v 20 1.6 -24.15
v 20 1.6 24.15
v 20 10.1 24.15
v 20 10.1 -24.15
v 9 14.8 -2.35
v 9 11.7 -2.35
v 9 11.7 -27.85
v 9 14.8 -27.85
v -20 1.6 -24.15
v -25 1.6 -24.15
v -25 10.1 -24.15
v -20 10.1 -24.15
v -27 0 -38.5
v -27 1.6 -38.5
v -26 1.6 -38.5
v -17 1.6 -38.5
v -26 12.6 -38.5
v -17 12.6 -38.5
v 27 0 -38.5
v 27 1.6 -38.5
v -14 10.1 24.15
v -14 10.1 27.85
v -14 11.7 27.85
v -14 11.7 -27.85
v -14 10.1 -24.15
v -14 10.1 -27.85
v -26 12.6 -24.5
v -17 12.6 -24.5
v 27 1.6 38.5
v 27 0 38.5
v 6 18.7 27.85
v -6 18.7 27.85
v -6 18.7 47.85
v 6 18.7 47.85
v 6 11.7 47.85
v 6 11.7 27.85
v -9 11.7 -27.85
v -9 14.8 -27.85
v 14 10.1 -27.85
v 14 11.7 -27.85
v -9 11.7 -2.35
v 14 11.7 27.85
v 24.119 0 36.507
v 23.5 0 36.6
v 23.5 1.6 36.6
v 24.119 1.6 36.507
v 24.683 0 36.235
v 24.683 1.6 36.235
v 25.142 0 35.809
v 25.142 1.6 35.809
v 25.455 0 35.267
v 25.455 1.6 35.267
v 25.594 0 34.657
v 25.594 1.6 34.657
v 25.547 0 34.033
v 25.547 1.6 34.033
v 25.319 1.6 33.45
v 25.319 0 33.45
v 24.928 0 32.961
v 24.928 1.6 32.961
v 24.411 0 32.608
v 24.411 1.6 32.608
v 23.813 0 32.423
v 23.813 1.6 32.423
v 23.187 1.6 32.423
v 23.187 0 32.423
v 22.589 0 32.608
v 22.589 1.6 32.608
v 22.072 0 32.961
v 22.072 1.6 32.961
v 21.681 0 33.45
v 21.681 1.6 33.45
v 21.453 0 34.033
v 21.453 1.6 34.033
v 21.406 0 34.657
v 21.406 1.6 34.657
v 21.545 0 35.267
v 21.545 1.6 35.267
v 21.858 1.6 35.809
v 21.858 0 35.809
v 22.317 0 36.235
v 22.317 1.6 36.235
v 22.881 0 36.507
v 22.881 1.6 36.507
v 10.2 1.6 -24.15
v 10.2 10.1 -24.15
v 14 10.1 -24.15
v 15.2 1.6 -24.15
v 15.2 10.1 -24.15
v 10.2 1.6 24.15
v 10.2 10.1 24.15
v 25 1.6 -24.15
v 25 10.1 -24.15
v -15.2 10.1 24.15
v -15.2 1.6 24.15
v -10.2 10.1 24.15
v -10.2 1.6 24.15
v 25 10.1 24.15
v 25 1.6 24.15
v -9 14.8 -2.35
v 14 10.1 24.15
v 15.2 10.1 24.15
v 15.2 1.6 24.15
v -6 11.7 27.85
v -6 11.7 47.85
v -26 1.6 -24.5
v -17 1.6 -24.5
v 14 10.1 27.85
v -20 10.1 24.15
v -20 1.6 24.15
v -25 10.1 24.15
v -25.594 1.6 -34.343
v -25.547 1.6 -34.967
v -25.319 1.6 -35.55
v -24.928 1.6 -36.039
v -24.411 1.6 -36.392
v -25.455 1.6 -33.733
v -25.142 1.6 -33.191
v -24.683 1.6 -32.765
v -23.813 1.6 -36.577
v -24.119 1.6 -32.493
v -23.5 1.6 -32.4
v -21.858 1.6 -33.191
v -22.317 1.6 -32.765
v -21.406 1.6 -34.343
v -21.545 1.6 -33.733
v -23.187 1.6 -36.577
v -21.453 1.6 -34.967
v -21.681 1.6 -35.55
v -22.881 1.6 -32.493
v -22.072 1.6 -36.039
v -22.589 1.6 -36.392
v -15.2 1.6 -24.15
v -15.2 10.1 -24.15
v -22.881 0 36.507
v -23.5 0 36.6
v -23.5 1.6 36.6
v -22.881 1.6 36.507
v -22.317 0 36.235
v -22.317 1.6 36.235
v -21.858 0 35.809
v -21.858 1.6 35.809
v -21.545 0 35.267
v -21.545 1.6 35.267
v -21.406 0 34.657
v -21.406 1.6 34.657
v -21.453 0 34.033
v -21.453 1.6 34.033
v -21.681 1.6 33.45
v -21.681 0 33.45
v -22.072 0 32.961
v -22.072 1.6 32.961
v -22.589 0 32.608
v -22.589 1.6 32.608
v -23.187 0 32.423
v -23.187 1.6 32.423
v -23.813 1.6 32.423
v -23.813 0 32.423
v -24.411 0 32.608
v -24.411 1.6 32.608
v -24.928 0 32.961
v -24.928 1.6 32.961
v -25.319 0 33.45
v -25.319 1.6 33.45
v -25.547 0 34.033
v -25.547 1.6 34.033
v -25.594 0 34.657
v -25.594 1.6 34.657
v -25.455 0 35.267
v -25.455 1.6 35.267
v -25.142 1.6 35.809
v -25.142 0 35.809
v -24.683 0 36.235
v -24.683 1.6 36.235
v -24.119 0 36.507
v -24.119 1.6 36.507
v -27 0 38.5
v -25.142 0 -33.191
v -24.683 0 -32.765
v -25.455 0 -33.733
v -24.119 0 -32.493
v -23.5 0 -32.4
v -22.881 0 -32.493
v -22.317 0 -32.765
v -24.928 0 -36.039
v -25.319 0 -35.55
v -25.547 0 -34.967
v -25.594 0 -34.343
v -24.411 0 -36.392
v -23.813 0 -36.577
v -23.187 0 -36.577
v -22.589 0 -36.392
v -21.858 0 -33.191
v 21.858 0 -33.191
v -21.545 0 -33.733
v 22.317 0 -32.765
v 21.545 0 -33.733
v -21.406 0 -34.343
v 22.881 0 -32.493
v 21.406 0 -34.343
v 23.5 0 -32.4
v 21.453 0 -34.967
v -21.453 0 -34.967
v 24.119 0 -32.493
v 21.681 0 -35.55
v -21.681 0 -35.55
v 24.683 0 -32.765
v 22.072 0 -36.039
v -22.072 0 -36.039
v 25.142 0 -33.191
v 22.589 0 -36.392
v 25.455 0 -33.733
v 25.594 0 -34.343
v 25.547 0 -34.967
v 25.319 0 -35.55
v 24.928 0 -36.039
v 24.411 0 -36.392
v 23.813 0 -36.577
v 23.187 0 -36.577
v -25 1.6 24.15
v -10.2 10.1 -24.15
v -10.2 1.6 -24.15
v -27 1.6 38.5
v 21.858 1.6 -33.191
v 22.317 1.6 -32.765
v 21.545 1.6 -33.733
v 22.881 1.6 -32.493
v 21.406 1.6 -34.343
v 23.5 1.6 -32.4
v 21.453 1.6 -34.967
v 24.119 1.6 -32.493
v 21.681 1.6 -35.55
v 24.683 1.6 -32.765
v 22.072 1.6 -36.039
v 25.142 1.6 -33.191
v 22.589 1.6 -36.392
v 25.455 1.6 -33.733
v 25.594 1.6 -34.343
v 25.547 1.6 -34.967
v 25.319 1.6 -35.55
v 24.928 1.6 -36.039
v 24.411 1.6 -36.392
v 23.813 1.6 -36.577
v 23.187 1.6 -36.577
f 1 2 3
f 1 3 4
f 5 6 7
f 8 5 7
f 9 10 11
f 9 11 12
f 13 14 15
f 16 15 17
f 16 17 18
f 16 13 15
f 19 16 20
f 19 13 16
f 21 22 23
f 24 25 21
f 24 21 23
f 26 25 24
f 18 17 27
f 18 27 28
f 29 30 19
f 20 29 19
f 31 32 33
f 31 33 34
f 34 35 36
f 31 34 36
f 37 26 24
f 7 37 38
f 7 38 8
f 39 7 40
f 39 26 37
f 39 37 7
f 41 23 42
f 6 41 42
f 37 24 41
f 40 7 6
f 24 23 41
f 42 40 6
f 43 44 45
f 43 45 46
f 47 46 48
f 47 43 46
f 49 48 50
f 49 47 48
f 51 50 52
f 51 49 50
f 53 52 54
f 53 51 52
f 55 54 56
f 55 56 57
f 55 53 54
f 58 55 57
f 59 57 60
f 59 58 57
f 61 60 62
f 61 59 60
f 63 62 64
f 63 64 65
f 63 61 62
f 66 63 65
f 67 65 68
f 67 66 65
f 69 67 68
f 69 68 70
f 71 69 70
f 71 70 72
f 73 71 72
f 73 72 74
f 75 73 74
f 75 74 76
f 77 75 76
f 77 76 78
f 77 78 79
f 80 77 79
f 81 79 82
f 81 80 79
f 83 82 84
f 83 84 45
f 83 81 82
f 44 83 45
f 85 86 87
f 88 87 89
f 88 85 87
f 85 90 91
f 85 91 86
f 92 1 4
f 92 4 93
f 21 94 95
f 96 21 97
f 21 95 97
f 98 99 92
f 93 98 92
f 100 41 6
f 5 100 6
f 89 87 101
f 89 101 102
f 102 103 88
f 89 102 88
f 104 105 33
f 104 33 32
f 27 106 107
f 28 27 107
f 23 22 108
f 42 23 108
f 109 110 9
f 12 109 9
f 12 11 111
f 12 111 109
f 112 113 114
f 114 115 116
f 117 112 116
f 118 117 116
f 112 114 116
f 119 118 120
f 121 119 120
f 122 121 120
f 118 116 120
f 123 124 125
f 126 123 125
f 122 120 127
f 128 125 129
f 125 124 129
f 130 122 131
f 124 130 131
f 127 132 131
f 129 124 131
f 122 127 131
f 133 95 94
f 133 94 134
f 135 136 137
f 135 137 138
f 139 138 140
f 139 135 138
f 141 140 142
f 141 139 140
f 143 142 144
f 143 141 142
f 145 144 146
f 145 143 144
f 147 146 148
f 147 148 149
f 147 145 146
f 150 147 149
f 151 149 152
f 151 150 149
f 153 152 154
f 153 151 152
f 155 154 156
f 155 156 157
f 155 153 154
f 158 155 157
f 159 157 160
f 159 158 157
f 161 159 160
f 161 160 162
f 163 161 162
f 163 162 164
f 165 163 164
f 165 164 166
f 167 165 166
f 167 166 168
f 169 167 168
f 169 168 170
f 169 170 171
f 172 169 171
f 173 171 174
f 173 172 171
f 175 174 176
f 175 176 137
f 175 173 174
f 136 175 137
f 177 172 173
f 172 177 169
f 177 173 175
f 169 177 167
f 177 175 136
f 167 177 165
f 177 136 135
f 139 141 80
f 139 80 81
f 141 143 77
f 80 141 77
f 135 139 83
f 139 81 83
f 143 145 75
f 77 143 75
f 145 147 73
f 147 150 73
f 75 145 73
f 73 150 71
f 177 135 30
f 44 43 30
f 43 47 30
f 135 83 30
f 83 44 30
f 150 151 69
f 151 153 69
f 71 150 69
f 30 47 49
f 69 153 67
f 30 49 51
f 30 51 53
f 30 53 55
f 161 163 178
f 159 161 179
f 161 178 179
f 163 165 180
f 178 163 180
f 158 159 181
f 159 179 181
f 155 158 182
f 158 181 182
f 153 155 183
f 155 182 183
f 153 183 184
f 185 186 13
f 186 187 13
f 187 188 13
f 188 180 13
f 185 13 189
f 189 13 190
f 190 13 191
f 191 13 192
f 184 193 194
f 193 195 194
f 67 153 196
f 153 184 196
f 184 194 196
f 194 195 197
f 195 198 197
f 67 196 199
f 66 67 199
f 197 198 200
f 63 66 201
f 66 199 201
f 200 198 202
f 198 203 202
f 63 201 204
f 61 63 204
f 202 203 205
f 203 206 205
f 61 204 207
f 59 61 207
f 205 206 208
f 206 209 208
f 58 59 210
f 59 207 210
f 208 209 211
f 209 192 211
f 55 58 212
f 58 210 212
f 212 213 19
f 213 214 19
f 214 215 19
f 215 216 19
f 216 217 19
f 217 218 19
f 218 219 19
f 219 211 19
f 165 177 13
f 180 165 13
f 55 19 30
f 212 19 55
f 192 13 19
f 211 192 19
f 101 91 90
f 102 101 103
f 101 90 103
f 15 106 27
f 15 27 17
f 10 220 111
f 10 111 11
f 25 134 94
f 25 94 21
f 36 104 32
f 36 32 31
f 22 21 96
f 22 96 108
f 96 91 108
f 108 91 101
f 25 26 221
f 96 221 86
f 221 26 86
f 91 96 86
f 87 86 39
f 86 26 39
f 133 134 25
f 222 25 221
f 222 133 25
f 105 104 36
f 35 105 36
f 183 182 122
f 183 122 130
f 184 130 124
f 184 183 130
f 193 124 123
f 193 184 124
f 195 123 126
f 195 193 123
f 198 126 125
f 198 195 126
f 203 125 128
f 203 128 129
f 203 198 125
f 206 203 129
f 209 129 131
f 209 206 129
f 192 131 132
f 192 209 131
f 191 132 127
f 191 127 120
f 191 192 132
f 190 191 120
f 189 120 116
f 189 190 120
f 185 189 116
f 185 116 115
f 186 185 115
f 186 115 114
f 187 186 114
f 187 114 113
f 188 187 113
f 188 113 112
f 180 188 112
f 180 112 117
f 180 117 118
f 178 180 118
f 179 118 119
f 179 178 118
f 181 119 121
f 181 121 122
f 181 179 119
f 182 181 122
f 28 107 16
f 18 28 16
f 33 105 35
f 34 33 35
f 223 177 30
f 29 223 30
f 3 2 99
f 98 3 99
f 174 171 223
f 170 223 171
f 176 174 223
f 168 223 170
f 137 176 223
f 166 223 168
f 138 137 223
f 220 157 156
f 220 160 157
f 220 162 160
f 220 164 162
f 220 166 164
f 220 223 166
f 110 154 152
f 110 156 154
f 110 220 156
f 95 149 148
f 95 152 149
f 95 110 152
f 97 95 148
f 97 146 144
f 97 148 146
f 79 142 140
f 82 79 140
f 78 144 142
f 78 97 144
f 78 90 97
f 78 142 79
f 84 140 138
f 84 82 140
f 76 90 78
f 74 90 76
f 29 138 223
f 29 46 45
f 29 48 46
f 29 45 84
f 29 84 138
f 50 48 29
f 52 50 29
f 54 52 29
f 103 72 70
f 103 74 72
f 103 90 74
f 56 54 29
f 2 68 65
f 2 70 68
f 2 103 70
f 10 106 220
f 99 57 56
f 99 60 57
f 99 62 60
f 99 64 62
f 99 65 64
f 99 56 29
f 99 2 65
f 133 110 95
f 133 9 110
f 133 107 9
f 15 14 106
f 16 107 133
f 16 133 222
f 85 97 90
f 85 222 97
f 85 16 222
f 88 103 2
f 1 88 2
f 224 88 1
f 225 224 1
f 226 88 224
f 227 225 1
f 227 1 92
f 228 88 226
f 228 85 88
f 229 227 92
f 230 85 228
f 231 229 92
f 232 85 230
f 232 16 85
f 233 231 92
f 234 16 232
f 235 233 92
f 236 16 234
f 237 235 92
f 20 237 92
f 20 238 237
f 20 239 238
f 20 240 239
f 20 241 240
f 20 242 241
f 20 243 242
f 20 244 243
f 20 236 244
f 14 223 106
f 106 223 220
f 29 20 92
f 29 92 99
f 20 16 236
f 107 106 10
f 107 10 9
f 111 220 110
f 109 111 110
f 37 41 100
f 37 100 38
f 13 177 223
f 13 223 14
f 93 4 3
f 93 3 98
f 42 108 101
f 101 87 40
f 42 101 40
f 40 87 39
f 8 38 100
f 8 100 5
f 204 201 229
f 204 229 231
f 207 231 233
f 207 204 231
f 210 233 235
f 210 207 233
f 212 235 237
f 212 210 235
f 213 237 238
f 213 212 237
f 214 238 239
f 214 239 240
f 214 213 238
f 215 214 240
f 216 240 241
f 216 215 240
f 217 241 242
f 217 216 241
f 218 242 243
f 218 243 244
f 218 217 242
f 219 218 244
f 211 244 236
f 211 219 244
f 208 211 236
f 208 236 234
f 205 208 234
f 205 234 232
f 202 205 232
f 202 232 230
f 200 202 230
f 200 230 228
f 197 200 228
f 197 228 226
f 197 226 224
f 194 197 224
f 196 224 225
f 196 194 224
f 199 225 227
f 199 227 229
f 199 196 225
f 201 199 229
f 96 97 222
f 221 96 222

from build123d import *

# Parameters (mm, degrees)
SK_CARRIER_W              = 54
SK_CARRIER_H              = 77
EX_CARRIER_DEPTH          = 1.6
SK_MOUNTHOLES_4XM4_R      = 2.1
CUT_MOUNTHOLES_4XM4_DEPTH = 1.6
SK_FEMALEHEADERS_W        = 5
SK_FEMALEHEADERS_H        = 48.3
EX_FEMALEHEADERS_DEPTH    = 8.5
SK_GPIO_HEADERS_W         = 5
SK_GPIO_HEADERS_H         = 48.3
EX_GPIO_HEADERS_DEPTH     = 8.5
SK_DC_JACK_W              = 9
SK_DC_JACK_H              = 14
EX_DC_JACK_DEPTH          = 11
SK_DEVKIT_W               = 28
SK_DEVKIT_H               = 55.7
EX_DEVKIT_DEPTH           = 1.6
SK_WROOM_MODULE_W         = 18
SK_WROOM_MODULE_H         = 25.5
EX_WROOM_MODULE_DEPTH     = 3.1
SK_KEEPOUT_USB_C_W        = 12
SK_KEEPOUT_USB_C_H        = 20
EX_KEEPOUT_USB_C_DEPTH    = 7


with BuildPart() as part:
    # SK_Carrier → EX_Carrier (new body)
    with BuildSketch(Plane(origin=(0, 0, 0), x_dir=(1, 0, 0), z_dir=(0, 1, 0))):
        Rectangle(SK_CARRIER_W, SK_CARRIER_H)
    extrude(amount=EX_CARRIER_DEPTH)

    # SK_MountHoles_4xM4 → CUT_MountHoles_4xM4 (cut)
    with BuildSketch(Plane(origin=(0, 0, 0), x_dir=(1, 0, 0), z_dir=(0, 1, 0))):
        with Locations((23.5, -34.5)):
            Circle(SK_MOUNTHOLES_4XM4_R)
        with Locations((-23.5, -34.5)):
            Circle(SK_MOUNTHOLES_4XM4_R)
        with Locations((23.5, 34.5)):
            Circle(SK_MOUNTHOLES_4XM4_R)
        with Locations((-23.5, 34.5)):
            Circle(SK_MOUNTHOLES_4XM4_R)
    extrude(amount=CUT_MOUNTHOLES_4XM4_DEPTH, mode=Mode.SUBTRACT)

    # SK_FemaleHeaders → EX_FemaleHeaders (add)
    with BuildSketch(Plane(origin=(0, 1.6, 0), x_dir=(1, 0, 0), z_dir=(0, 1, 0))):
        with Locations((12.7, 0)):
            Rectangle(SK_FEMALEHEADERS_W, SK_FEMALEHEADERS_H)
        with Locations((-12.7, 0)):
            Rectangle(SK_FEMALEHEADERS_W, SK_FEMALEHEADERS_H)
    extrude(amount=EX_FEMALEHEADERS_DEPTH)

    # SK_GPIO_Headers → EX_GPIO_Headers (add)
    with BuildSketch(Plane(origin=(0, 1.6, 0), x_dir=(1, 0, 0), z_dir=(0, 1, 0))):
        with Locations((22.5, 0)):
            Rectangle(SK_GPIO_HEADERS_W, SK_GPIO_HEADERS_H)
        with Locations((-22.5, 0)):
            Rectangle(SK_GPIO_HEADERS_W, SK_GPIO_HEADERS_H)
    extrude(amount=EX_GPIO_HEADERS_DEPTH)

    # SK_DC_Jack → EX_DC_Jack (add)
    with BuildSketch(Plane(origin=(0, 1.6, 0), x_dir=(1, 0, 0), z_dir=(0, 1, 0))):
        with Locations((-21.5, 31.5)):
            Rectangle(SK_DC_JACK_W, SK_DC_JACK_H)
    extrude(amount=EX_DC_JACK_DEPTH)

    # SK_DevKit → EX_DevKit (add)
    with BuildSketch(Plane(origin=(0, 10.1, 0), x_dir=(1, 0, 0), z_dir=(0, 1, 0))):
        Rectangle(SK_DEVKIT_W, SK_DEVKIT_H)
    extrude(amount=EX_DEVKIT_DEPTH)

    # SK_WROOM_Module → EX_WROOM_Module (add)
    with BuildSketch(Plane(origin=(0, 11.7, 0), x_dir=(1, 0, 0), z_dir=(0, 1, 0))):
        with Locations((0, 15.1)):
            Rectangle(SK_WROOM_MODULE_W, SK_WROOM_MODULE_H)
    extrude(amount=EX_WROOM_MODULE_DEPTH)


with BuildPart() as body_2:
    # SK_KeepOut_USB_C → EX_KeepOut_USB_C (new body)
    with BuildSketch(Plane(origin=(0, 11.7, 0), x_dir=(1, 0, 0), z_dir=(0, 1, 0))):
        with Locations((0, -37.85)):
            Rectangle(SK_KEEPOUT_USB_C_W, SK_KEEPOUT_USB_C_H)
    extrude(amount=EX_KEEPOUT_USB_C_DEPTH)


solid = Compound([part.part, body_2.part])
